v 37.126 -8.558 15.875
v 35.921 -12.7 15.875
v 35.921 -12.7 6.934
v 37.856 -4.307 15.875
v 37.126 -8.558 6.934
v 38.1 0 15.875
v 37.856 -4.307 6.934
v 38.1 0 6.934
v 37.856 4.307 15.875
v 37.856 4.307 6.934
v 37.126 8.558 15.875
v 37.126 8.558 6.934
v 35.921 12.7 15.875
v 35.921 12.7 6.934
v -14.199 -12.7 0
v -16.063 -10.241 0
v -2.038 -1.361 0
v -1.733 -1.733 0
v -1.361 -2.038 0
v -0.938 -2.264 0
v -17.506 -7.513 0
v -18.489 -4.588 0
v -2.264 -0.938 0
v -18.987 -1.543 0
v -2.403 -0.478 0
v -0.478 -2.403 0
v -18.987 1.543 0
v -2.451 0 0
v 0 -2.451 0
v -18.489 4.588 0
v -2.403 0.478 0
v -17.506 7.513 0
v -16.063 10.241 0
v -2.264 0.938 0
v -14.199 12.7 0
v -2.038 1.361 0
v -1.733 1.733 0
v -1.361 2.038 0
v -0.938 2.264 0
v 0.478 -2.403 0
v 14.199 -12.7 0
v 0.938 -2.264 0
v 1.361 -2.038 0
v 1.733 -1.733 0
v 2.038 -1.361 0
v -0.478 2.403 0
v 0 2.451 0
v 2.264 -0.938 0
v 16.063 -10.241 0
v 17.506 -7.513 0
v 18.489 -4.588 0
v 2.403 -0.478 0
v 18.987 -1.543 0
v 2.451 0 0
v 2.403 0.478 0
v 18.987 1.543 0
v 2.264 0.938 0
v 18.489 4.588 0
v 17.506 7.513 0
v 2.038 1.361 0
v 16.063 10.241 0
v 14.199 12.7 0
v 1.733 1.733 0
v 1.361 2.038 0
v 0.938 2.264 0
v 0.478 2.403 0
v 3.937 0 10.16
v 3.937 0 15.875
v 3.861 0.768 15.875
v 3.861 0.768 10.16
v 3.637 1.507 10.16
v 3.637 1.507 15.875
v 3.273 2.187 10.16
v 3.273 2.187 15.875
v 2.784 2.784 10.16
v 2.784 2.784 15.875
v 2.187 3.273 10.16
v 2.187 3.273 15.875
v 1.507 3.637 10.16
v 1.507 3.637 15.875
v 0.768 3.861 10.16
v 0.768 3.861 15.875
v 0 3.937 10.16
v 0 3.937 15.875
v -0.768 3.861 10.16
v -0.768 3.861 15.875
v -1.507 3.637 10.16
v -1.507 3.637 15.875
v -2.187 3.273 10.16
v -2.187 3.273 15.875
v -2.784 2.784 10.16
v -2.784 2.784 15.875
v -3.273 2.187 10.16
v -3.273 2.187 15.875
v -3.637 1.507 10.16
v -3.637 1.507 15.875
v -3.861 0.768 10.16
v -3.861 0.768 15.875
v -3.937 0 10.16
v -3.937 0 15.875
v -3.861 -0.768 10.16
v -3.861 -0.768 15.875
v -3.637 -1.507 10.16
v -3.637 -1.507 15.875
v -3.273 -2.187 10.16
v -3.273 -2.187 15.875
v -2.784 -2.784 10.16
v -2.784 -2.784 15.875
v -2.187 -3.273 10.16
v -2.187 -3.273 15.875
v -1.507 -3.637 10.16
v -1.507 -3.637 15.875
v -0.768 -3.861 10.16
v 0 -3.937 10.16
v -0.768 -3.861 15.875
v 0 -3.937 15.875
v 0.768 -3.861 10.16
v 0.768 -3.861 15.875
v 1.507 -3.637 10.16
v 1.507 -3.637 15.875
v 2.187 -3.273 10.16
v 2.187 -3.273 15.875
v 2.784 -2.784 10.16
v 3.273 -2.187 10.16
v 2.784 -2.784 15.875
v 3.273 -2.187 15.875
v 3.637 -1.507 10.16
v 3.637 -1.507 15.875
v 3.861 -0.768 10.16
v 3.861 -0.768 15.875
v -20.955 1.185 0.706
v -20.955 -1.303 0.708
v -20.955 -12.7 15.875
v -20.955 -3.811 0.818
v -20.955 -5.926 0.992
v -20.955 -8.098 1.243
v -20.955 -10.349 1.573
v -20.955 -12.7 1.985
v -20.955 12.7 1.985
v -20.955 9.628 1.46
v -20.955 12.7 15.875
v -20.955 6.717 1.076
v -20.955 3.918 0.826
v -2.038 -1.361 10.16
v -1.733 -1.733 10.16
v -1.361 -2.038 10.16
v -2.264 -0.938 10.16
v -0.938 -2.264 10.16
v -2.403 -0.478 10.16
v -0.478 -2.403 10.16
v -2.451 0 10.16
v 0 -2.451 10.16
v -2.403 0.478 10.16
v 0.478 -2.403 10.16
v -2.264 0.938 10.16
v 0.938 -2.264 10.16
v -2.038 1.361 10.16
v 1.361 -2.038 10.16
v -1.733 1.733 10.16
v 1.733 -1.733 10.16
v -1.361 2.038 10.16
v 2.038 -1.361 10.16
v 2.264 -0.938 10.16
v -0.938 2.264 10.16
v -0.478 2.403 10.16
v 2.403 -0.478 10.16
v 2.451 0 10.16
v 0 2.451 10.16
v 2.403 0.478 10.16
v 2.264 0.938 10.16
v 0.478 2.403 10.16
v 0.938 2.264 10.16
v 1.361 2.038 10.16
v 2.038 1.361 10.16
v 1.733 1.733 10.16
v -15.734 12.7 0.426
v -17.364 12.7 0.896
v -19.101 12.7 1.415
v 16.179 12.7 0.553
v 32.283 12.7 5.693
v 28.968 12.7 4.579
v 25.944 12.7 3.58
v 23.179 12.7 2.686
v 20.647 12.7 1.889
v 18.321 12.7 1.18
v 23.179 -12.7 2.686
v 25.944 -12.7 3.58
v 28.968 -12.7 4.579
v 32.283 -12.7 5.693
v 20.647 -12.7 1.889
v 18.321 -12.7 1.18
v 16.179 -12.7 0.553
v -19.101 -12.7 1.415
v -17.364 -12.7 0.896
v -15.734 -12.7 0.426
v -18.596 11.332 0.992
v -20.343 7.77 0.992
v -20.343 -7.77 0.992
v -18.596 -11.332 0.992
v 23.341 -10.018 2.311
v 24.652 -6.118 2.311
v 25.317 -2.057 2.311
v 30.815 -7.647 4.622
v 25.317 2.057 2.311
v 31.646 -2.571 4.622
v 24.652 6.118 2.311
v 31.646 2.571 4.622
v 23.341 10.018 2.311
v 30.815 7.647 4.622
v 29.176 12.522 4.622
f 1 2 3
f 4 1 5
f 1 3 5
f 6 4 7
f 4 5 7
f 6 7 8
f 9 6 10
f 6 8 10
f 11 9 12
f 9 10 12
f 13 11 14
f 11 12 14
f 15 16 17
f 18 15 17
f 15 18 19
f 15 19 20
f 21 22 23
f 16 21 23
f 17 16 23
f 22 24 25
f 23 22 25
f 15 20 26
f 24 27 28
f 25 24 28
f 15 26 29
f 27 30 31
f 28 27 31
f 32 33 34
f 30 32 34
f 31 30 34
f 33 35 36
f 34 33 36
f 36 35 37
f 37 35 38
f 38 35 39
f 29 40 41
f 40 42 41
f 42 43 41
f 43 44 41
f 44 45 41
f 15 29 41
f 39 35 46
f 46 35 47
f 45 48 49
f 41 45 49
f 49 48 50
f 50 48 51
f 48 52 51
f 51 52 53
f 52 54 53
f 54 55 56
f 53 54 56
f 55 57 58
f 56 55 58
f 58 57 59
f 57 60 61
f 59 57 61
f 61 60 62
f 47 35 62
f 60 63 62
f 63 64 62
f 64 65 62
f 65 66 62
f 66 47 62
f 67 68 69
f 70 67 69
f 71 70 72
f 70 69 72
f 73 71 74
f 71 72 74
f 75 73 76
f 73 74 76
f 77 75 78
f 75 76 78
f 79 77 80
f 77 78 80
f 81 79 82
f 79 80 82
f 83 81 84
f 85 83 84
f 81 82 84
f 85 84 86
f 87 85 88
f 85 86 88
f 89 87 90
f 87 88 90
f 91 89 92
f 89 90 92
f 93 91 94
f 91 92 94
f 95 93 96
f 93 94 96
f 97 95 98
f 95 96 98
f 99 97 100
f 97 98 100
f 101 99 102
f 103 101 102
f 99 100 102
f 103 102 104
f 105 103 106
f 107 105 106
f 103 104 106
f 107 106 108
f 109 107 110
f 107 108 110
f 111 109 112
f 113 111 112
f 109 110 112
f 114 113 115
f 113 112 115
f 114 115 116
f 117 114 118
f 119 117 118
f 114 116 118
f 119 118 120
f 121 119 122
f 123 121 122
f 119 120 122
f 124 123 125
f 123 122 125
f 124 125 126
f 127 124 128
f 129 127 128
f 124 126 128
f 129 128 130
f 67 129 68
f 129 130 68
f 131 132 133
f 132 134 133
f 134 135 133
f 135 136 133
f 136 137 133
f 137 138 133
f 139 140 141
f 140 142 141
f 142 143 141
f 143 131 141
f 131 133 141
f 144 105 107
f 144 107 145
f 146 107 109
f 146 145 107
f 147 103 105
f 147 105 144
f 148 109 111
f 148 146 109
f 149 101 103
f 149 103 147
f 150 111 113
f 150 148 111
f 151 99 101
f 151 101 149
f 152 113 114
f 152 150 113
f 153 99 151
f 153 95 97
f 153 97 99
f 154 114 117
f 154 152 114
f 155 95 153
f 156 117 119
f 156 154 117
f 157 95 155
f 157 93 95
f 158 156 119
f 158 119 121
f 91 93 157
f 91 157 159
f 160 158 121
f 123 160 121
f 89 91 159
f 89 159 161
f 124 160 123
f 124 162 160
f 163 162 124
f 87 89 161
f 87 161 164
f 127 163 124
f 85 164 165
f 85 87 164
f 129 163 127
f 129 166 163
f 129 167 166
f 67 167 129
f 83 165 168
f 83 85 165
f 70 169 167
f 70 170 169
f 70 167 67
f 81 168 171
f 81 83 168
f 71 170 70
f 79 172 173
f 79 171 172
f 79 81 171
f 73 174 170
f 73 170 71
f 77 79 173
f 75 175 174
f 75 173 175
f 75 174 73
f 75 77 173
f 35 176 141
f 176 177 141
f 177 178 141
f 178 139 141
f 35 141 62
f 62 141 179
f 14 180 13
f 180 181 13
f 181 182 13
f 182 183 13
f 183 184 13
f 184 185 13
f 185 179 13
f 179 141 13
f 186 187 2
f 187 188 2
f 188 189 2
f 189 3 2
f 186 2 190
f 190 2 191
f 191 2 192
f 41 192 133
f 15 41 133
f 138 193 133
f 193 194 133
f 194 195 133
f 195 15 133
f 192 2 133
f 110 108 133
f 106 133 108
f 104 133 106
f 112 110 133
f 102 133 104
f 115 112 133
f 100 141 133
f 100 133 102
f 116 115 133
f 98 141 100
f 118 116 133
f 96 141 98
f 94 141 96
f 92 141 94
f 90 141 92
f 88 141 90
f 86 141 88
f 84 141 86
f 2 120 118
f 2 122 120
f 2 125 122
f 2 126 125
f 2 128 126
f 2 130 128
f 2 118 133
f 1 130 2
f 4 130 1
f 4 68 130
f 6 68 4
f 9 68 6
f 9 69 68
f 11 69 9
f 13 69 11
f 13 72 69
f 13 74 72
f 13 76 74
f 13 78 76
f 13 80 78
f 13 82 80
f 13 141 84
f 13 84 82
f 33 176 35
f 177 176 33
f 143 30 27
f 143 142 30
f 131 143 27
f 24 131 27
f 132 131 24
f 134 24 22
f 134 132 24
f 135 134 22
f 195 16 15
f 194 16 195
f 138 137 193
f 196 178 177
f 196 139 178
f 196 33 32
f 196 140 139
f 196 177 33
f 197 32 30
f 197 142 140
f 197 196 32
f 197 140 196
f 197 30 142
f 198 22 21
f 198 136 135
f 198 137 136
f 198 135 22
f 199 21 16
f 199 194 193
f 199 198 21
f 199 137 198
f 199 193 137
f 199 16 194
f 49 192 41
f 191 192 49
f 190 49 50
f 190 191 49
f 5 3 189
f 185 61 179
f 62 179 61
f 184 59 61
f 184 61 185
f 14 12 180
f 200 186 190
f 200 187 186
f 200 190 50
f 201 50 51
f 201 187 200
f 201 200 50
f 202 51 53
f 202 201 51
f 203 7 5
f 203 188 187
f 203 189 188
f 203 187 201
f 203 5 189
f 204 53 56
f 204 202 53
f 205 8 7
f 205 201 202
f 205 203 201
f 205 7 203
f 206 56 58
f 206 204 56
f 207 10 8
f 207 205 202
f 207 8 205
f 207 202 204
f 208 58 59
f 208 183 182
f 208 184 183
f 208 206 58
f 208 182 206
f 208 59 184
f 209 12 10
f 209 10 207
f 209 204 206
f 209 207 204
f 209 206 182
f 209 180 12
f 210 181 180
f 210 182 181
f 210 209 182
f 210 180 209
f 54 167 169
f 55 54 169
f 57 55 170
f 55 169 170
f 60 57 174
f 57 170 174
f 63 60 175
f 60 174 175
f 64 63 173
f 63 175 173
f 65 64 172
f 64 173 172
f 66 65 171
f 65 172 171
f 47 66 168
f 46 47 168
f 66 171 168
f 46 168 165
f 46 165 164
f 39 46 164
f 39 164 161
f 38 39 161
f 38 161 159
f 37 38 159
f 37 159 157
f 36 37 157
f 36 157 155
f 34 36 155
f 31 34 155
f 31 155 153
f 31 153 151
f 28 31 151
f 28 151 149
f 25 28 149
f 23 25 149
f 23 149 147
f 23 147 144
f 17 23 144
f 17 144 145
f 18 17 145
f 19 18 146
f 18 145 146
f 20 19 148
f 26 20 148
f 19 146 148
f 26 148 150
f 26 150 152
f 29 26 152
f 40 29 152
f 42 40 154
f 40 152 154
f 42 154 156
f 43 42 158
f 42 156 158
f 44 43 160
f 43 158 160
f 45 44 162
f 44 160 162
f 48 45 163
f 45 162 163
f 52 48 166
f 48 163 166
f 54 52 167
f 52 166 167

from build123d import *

# Parameters (mm, degrees)
SKETCH1_R           = 38.1
BOSS_EXTRUDE1_DEPTH = 15.875
SKETCH2_R           = 3.937
CUT_EXTRUDE1_DEPTH  = 5.715
SKETCH3_R           = 2.450575626
CUT_EXTRUDE2_DEPTH  = 55.831064188
CHAMFER1_SIZE       = 19.05
CHAMFER1_SIZE2      = 6.933632963
CUT_EXTRUDE3_DEPTH  = 57.171484091


with BuildPart() as part:
    # Sketch1 → Boss-Extrude1 (new body)
    with BuildSketch(Plane.XY):
        Circle(SKETCH1_R)
    extrude(amount=BOSS_EXTRUDE1_DEPTH)

    # Sketch2 → Cut-Extrude1 (cut)
    with BuildSketch(Plane.XY.offset(15.875)):
        Circle(SKETCH2_R)
    extrude(amount=-CUT_EXTRUDE1_DEPTH, mode=Mode.SUBTRACT)

    # Sketch3 → Cut-Extrude2 (cut, through all)
    with BuildSketch(Plane.XY.offset(10.16)):
        Circle(SKETCH3_R)
    extrude(amount=-CUT_EXTRUDE2_DEPTH, mode=Mode.SUBTRACT)

    # Chamfer1
    chamfer1_edges = [part.edges().sort_by_distance(p)[0] for p in [
        (-38.1, 0, 0),
    ]]
    chamfer1_side = [part.faces().sort_by_distance(p)[0] for p in [
        (-37.022369265, 0, 0),
    ]]
    chamfer(chamfer1_edges, length=CHAMFER1_SIZE, length2=CHAMFER1_SIZE2, reference=chamfer1_side[0])

    # Sketch4 → Cut-Extrude3 (cut, through all)
    with BuildSketch(Plane.XY.offset(15.875)):
        with BuildLine():
            ThreePointArc((35.921024484, 12.7), (-38.1, 0), (35.921024484, -12.7))
            Line((35.921024484, -12.7), (-20.955, -12.7))
            Line((-20.955, -12.7), (-20.955, 12.7))
            Line((-20.955, 12.7), (35.921024484, 12.7))
        make_face()
    extrude(amount=-CUT_EXTRUDE3_DEPTH, mode=Mode.SUBTRACT)


solid = part.part
